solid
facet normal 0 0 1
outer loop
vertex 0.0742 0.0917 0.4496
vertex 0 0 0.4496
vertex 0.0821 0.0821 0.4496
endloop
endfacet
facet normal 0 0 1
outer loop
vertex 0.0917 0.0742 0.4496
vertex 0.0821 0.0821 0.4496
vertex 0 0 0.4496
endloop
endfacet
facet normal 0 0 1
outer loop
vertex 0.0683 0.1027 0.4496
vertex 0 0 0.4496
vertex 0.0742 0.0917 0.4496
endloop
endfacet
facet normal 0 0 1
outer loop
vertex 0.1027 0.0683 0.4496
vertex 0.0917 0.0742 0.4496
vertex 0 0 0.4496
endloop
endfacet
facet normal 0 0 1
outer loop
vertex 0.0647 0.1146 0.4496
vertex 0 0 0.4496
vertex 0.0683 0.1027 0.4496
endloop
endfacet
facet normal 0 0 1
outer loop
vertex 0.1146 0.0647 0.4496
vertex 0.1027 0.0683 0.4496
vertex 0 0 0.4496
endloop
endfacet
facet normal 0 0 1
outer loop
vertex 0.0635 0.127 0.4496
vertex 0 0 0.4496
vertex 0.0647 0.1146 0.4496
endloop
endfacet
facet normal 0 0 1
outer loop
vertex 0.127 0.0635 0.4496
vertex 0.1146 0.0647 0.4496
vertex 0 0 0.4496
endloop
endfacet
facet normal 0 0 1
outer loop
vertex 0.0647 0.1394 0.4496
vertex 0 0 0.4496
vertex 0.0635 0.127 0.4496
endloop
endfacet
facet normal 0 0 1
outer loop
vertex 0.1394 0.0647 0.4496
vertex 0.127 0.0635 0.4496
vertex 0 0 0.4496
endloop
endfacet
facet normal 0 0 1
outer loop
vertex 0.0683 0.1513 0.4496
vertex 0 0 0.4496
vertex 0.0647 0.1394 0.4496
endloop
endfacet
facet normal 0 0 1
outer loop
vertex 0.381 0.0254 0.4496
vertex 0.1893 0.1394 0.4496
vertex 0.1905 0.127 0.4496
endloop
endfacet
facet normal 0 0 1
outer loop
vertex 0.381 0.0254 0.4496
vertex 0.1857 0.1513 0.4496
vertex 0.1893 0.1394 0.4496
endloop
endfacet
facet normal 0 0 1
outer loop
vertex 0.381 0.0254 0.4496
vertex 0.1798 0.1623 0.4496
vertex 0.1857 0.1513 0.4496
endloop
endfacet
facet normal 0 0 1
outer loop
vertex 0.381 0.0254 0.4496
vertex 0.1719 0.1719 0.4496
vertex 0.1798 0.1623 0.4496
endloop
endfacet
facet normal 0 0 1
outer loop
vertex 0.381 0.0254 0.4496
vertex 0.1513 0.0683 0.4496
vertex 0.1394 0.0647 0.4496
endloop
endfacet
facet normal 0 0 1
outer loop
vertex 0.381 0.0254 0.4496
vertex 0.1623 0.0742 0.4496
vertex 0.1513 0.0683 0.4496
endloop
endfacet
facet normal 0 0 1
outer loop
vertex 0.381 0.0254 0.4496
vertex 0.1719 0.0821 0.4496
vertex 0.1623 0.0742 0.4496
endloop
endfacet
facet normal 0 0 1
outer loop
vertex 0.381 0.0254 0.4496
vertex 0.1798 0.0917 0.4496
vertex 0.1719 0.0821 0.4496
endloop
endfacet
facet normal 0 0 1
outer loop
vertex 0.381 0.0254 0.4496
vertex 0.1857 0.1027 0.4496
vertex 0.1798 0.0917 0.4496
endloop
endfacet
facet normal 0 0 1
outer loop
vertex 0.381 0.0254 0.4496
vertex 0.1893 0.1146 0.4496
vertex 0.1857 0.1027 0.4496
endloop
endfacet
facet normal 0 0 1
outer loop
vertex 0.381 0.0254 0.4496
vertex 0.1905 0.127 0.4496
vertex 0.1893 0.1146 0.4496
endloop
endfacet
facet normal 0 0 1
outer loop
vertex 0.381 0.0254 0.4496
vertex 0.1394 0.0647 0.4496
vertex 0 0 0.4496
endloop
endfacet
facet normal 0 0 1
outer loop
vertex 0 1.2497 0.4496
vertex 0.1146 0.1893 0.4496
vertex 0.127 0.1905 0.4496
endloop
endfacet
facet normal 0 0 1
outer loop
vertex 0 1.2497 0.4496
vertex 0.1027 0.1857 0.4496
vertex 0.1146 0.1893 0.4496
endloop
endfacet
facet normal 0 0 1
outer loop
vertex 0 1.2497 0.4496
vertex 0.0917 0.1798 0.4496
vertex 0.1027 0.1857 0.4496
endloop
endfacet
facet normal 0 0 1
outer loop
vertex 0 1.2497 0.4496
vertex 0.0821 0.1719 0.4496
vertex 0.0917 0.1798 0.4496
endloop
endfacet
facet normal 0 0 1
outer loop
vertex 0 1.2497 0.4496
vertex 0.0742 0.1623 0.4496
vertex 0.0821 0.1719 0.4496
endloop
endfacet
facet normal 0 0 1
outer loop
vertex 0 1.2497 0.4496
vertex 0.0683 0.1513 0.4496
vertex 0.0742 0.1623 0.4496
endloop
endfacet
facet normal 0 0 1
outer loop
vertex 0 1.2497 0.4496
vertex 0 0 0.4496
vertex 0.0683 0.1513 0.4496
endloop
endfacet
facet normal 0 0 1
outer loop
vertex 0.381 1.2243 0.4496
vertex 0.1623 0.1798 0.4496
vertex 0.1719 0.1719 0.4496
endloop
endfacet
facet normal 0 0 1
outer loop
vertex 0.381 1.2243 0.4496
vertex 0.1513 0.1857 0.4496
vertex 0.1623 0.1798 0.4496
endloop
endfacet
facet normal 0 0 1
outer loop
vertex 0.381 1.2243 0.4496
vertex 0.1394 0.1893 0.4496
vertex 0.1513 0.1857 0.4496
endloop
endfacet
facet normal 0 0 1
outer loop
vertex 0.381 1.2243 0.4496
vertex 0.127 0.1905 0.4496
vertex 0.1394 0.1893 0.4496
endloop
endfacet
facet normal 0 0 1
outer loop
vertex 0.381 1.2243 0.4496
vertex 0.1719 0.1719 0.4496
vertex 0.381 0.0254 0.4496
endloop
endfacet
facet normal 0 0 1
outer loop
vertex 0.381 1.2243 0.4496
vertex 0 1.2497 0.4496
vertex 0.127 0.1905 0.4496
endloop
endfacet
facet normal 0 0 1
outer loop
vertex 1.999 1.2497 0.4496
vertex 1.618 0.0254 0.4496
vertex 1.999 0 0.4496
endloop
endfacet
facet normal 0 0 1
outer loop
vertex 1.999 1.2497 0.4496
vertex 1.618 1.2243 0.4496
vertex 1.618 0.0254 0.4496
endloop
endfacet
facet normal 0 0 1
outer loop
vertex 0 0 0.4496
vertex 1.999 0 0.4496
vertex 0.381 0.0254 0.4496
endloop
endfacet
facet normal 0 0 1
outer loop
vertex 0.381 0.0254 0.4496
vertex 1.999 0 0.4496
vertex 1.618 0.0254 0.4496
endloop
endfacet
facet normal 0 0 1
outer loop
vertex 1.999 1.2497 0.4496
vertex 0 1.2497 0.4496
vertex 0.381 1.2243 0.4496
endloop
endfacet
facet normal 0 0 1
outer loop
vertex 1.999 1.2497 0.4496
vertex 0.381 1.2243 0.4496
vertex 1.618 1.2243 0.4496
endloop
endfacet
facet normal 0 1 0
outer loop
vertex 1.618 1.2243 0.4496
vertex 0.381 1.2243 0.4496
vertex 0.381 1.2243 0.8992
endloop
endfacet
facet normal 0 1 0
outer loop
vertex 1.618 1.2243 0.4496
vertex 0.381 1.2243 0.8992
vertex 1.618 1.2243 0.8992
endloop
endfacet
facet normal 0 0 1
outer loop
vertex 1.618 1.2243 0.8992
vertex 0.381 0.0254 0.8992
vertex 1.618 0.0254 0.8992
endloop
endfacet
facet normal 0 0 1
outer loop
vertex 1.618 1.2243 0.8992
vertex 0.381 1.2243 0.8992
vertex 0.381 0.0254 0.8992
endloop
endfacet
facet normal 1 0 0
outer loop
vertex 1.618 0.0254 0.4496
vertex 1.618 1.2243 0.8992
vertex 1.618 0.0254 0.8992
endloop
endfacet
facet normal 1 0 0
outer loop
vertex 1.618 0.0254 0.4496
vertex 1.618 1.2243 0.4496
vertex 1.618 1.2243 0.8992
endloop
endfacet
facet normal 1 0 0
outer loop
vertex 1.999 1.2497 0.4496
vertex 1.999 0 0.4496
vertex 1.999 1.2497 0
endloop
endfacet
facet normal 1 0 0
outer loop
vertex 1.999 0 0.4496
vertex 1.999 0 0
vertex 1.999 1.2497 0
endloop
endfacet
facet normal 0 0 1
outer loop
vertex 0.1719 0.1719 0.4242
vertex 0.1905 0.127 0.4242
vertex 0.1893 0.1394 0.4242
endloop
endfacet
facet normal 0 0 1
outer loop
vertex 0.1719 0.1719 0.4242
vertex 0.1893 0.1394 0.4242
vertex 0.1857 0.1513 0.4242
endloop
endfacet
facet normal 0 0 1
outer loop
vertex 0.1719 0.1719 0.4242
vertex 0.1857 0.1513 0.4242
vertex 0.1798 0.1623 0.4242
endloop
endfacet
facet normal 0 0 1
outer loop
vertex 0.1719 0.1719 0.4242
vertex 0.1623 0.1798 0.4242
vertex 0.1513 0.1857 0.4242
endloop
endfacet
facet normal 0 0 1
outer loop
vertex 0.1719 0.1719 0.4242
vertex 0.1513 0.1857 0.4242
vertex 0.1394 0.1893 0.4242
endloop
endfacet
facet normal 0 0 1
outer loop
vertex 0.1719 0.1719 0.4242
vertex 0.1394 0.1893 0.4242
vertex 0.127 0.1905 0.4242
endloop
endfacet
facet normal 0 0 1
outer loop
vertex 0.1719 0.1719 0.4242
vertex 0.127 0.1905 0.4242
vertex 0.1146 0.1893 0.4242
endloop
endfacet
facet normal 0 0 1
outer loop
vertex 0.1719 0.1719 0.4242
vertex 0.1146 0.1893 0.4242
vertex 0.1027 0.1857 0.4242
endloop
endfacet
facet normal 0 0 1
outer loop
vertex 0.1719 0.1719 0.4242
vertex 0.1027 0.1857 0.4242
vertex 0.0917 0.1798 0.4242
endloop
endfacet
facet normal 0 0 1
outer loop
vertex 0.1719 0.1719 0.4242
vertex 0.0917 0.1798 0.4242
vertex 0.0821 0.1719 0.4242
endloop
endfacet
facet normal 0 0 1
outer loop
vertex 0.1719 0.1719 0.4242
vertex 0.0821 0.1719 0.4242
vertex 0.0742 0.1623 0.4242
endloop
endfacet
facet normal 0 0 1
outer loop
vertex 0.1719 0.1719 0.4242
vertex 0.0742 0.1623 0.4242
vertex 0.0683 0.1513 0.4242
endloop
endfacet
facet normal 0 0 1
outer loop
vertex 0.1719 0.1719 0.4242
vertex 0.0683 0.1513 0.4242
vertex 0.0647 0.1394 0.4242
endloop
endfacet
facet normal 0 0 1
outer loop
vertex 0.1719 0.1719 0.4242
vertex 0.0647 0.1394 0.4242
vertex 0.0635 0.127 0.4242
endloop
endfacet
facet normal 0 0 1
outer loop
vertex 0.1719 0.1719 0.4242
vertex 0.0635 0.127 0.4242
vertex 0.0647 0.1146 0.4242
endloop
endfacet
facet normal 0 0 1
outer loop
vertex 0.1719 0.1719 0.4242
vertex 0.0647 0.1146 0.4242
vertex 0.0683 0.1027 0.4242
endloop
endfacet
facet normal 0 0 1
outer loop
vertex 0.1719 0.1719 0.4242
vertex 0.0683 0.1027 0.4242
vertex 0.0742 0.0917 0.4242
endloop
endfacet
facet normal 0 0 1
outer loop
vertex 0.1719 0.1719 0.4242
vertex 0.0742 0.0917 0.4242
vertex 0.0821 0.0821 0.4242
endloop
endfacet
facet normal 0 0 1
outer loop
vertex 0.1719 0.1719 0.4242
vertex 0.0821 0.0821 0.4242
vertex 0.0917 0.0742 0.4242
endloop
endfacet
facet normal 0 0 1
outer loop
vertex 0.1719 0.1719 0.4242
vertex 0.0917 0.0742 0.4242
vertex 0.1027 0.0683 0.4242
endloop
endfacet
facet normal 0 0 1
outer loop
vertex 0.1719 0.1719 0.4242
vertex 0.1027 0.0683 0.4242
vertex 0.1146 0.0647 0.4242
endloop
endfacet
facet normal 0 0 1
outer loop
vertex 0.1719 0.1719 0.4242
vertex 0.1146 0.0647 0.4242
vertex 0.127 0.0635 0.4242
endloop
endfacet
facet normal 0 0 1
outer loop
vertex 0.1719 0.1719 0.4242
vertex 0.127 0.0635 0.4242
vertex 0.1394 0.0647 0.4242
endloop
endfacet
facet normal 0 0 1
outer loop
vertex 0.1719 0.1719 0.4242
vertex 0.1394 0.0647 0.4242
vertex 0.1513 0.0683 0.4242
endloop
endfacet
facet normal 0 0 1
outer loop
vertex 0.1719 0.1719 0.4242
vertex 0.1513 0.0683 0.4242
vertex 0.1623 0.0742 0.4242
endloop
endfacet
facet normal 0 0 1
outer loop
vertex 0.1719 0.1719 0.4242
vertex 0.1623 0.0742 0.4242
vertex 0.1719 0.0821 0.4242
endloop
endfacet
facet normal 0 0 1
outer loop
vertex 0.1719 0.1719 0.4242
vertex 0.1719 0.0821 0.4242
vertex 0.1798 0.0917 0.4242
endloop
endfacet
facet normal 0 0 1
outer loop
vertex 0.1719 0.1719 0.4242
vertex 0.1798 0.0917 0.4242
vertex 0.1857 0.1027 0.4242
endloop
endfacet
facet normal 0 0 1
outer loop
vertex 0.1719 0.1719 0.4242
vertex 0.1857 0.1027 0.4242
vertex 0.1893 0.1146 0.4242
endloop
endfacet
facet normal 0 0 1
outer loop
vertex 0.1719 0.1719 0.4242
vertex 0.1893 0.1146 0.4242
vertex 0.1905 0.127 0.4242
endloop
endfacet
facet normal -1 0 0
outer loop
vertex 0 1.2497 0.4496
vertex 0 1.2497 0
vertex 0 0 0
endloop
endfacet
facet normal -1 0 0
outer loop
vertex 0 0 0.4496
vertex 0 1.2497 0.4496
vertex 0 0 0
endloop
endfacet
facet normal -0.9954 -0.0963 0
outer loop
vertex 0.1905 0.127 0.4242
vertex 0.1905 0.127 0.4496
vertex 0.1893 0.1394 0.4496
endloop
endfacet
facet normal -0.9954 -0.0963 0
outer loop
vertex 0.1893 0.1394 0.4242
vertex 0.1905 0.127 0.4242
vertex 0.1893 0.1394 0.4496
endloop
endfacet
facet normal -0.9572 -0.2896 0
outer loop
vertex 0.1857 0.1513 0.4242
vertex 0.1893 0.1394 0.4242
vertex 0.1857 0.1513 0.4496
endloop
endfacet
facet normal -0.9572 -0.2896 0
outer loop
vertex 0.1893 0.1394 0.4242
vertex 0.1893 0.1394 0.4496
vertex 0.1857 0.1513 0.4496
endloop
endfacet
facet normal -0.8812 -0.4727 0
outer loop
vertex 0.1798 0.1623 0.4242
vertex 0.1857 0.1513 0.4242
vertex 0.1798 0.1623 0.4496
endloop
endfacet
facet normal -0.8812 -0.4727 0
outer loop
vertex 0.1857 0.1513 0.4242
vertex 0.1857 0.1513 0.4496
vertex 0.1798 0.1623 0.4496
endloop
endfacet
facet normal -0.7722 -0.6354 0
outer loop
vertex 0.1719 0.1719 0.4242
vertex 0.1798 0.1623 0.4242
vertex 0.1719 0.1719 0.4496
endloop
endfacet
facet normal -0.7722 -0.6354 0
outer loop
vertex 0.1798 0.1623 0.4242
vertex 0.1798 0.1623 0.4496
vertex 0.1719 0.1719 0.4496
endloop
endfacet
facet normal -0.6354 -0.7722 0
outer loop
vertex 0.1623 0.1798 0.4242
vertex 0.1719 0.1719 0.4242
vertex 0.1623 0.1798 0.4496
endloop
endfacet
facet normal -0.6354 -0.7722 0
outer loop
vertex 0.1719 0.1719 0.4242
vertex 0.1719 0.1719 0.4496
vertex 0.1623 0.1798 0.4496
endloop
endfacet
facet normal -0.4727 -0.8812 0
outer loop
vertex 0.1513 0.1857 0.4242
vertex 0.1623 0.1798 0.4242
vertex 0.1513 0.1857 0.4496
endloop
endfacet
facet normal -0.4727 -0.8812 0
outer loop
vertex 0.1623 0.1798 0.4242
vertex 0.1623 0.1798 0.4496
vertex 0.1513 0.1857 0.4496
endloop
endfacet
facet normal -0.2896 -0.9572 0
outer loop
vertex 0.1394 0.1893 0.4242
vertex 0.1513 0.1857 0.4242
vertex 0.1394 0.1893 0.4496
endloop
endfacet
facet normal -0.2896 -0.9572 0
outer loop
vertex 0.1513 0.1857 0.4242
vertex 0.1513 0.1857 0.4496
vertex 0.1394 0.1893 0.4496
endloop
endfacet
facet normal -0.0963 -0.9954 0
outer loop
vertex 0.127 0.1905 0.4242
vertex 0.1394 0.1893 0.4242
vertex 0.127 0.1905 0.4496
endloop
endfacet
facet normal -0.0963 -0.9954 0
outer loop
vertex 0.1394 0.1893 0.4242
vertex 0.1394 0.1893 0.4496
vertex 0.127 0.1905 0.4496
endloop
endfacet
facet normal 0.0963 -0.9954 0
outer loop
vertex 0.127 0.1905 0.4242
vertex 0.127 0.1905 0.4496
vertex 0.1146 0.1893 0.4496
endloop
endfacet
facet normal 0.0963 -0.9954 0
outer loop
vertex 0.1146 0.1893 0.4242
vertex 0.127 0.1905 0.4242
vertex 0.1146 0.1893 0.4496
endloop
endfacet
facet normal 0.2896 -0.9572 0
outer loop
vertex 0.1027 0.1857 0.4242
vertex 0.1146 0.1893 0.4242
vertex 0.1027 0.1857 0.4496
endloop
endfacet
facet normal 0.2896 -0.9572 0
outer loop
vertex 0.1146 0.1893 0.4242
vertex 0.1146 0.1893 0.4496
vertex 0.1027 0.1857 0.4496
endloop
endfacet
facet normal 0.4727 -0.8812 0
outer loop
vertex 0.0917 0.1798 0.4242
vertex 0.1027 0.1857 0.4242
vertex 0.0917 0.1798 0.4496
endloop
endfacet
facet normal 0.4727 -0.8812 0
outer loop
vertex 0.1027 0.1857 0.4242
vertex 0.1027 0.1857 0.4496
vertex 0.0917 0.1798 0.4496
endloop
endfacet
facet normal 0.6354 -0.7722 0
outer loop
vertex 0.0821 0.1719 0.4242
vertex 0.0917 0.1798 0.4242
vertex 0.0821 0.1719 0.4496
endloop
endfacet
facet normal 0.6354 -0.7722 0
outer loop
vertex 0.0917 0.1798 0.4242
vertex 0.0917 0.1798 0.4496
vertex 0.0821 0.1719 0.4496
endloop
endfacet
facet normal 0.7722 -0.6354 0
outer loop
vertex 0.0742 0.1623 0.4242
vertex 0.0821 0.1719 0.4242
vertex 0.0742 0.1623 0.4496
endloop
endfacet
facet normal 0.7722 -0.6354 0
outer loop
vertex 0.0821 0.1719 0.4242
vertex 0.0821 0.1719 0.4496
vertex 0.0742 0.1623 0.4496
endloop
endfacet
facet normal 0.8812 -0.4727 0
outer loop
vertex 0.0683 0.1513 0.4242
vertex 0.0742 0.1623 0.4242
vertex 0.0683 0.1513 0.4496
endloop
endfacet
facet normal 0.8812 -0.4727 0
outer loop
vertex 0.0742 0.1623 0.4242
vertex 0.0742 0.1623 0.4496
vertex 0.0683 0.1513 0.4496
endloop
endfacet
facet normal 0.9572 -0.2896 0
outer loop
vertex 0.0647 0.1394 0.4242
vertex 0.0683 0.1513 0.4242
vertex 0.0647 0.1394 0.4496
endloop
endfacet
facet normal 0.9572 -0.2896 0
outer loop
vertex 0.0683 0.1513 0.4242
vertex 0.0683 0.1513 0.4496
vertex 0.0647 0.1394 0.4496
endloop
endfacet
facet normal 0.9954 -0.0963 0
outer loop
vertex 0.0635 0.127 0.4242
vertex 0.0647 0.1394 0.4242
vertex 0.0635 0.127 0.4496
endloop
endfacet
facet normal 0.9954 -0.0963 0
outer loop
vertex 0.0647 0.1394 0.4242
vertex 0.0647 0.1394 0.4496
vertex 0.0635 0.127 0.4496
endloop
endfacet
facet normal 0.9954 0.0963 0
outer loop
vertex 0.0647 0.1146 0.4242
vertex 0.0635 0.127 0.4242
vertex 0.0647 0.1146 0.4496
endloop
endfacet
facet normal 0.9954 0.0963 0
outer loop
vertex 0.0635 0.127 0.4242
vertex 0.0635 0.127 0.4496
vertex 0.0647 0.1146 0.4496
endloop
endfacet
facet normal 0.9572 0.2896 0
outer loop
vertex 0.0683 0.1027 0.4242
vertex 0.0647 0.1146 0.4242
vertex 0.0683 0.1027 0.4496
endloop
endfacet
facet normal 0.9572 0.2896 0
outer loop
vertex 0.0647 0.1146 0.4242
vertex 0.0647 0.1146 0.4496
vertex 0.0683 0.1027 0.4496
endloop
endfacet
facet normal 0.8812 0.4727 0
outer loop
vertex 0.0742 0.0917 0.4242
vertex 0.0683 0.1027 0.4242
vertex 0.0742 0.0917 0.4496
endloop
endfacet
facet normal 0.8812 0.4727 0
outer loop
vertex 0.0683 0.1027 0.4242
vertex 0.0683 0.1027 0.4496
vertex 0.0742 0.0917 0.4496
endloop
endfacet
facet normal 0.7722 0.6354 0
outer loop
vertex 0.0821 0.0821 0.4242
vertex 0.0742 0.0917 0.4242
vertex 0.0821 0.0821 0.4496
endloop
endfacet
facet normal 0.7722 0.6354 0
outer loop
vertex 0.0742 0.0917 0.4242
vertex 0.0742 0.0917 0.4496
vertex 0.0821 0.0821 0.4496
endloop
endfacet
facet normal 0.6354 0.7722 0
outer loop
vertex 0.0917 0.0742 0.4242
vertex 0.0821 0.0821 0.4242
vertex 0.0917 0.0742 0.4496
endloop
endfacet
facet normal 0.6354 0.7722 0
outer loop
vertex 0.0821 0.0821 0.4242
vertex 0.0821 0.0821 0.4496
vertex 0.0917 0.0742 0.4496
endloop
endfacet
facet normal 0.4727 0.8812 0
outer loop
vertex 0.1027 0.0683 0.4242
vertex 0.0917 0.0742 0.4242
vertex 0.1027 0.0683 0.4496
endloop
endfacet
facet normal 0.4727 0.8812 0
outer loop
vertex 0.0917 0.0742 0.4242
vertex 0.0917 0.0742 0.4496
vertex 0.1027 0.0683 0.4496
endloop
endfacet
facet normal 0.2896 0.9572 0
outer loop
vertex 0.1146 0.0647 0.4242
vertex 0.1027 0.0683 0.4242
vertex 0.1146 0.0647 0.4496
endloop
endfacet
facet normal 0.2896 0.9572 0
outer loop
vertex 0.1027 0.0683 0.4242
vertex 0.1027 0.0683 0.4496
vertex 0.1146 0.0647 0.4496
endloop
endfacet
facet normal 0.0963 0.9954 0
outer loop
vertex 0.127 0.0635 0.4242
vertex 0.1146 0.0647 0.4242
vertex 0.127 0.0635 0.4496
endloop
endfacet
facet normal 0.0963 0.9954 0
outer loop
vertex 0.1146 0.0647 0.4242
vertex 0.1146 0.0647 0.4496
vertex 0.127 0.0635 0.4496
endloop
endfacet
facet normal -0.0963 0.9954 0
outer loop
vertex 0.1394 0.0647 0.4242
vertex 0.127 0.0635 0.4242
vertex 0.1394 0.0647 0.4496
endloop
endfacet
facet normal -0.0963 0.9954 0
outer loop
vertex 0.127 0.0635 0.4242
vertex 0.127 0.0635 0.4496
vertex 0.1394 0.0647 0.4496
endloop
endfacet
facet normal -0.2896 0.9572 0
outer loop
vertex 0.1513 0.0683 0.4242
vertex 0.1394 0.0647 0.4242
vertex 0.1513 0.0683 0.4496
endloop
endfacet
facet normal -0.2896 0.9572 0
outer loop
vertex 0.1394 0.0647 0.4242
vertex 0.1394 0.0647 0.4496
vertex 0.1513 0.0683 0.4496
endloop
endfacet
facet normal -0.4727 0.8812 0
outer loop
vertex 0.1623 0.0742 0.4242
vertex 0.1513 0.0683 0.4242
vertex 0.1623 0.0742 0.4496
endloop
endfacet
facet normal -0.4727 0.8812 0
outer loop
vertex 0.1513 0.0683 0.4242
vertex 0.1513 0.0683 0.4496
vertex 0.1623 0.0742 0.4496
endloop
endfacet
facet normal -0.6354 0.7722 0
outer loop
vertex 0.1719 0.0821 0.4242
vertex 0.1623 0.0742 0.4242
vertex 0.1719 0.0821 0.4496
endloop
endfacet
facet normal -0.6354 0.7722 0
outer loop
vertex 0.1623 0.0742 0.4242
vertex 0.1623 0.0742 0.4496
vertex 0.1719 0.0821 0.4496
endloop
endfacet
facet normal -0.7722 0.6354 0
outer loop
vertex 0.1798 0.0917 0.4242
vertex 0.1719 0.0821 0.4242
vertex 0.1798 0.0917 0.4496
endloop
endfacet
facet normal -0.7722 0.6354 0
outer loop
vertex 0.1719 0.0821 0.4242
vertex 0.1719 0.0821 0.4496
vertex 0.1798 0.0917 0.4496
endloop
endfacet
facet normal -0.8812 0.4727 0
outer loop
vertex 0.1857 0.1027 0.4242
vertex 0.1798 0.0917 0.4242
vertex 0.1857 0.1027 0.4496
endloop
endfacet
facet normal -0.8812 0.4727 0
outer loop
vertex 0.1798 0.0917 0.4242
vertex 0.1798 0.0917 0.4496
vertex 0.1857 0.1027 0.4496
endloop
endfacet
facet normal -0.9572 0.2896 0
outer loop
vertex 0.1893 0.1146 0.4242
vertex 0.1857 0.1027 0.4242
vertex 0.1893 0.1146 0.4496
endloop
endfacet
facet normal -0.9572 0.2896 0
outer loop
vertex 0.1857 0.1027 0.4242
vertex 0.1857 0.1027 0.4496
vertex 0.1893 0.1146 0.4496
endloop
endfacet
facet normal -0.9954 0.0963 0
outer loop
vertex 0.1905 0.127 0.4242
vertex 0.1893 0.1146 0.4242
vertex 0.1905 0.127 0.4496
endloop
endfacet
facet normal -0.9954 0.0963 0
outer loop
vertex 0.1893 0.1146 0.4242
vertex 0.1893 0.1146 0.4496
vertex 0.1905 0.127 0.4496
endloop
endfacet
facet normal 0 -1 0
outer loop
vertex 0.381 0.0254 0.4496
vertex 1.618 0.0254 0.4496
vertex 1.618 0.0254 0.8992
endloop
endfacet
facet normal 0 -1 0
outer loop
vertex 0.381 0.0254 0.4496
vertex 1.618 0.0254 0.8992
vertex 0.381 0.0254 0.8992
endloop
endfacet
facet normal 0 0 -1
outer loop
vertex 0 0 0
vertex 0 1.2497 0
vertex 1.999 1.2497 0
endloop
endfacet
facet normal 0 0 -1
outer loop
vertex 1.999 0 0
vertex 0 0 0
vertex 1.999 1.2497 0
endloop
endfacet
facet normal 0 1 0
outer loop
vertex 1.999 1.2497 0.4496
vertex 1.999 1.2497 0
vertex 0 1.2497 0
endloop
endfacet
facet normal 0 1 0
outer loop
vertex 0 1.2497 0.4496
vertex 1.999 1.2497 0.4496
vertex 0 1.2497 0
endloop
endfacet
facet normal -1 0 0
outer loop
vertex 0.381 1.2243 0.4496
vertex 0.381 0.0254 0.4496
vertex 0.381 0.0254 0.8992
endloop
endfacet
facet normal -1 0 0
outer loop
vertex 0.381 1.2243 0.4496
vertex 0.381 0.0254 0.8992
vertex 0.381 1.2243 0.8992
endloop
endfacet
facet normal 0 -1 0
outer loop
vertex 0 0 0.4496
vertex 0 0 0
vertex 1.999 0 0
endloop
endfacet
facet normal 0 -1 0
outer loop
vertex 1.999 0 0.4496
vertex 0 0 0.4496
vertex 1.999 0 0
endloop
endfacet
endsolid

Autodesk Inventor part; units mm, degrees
ref_plane "YZ Plane" through (0, 0, 0) normal (1, 0, 0) x (0, 1, 0)
ref_plane "XZ Plane" through (0, 0, 0) normal (0, 1, 0) x (-1, 0, 0)
ref_plane "XY Plane" through (0, 0, 0) normal (0, 0, 1) x (1, 0, 0)
sketch "Sketch1" plane through (0, 0, 0) normal (0, 0, 1) x (1, 0, 0)
  line L0 (0, 0) -> (1.999, 0)
  line L1 (1.999, 0) -> (1.999, 1.2497)
  line L2 (1.999, 1.2497) -> (0, 1.2497)
  line L3 (0, 1.2497) -> (0, 0)
  dimension "d0" = 1.999
  dimension "d1" = 1.2497
extrude "Extrusion1" add sketch "Sketch1" along normal blind 0.4496
sketch "Sketch2" plane through (0, 0, 0.4496) normal (0, 0, 1) x (1, 0, 0)
  line L0 (0.381, 1.2243) -> (1.618, 1.2243)
  line L1 (1.618, 1.2243) -> (1.618, 0.0254)
  line L2 (1.618, 0.0254) -> (0.381, 0.0254)
  line L3 (0.381, 0.0254) -> (0.381, 1.2243)
  line L4 (0, 1.2497) -> (0, 0) projected
  line L5 (1.999, 0) -> (1.999, 1.2497) projected
  line L6 (1.999, 1.2497) -> (0, 1.2497) projected
  line L7 (0, 0) -> (1.999, 0) projected
  dimension "d4" = 0.381
  dimension "d5" = 0.381
  dimension "d6" = 0.0254
  dimension "d7" = 0.0254
extrude "Extrusion2" add sketch "Sketch2" along normal blind 0.4496 contours L0 L1 L2 L3
sketch "Sketch3" plane through (0, 0, 0.4496) normal (0, 0, 1) x (1, 0, 0)
  circle A0 centre (0.127, 0.127) radius 0.0635
  line L0 (0, 0) -> (1.999, 0) projected
  line L1 (0, 1.2497) -> (0, 0) projected
  dimension "d10" = 0.127
  dimension "d11" = 0.127
  dimension "d12" = 0.127
extrude "Extrusion3" cut sketch "Sketch3" against normal blind 0.0254
properties part number "sSmall LED"
